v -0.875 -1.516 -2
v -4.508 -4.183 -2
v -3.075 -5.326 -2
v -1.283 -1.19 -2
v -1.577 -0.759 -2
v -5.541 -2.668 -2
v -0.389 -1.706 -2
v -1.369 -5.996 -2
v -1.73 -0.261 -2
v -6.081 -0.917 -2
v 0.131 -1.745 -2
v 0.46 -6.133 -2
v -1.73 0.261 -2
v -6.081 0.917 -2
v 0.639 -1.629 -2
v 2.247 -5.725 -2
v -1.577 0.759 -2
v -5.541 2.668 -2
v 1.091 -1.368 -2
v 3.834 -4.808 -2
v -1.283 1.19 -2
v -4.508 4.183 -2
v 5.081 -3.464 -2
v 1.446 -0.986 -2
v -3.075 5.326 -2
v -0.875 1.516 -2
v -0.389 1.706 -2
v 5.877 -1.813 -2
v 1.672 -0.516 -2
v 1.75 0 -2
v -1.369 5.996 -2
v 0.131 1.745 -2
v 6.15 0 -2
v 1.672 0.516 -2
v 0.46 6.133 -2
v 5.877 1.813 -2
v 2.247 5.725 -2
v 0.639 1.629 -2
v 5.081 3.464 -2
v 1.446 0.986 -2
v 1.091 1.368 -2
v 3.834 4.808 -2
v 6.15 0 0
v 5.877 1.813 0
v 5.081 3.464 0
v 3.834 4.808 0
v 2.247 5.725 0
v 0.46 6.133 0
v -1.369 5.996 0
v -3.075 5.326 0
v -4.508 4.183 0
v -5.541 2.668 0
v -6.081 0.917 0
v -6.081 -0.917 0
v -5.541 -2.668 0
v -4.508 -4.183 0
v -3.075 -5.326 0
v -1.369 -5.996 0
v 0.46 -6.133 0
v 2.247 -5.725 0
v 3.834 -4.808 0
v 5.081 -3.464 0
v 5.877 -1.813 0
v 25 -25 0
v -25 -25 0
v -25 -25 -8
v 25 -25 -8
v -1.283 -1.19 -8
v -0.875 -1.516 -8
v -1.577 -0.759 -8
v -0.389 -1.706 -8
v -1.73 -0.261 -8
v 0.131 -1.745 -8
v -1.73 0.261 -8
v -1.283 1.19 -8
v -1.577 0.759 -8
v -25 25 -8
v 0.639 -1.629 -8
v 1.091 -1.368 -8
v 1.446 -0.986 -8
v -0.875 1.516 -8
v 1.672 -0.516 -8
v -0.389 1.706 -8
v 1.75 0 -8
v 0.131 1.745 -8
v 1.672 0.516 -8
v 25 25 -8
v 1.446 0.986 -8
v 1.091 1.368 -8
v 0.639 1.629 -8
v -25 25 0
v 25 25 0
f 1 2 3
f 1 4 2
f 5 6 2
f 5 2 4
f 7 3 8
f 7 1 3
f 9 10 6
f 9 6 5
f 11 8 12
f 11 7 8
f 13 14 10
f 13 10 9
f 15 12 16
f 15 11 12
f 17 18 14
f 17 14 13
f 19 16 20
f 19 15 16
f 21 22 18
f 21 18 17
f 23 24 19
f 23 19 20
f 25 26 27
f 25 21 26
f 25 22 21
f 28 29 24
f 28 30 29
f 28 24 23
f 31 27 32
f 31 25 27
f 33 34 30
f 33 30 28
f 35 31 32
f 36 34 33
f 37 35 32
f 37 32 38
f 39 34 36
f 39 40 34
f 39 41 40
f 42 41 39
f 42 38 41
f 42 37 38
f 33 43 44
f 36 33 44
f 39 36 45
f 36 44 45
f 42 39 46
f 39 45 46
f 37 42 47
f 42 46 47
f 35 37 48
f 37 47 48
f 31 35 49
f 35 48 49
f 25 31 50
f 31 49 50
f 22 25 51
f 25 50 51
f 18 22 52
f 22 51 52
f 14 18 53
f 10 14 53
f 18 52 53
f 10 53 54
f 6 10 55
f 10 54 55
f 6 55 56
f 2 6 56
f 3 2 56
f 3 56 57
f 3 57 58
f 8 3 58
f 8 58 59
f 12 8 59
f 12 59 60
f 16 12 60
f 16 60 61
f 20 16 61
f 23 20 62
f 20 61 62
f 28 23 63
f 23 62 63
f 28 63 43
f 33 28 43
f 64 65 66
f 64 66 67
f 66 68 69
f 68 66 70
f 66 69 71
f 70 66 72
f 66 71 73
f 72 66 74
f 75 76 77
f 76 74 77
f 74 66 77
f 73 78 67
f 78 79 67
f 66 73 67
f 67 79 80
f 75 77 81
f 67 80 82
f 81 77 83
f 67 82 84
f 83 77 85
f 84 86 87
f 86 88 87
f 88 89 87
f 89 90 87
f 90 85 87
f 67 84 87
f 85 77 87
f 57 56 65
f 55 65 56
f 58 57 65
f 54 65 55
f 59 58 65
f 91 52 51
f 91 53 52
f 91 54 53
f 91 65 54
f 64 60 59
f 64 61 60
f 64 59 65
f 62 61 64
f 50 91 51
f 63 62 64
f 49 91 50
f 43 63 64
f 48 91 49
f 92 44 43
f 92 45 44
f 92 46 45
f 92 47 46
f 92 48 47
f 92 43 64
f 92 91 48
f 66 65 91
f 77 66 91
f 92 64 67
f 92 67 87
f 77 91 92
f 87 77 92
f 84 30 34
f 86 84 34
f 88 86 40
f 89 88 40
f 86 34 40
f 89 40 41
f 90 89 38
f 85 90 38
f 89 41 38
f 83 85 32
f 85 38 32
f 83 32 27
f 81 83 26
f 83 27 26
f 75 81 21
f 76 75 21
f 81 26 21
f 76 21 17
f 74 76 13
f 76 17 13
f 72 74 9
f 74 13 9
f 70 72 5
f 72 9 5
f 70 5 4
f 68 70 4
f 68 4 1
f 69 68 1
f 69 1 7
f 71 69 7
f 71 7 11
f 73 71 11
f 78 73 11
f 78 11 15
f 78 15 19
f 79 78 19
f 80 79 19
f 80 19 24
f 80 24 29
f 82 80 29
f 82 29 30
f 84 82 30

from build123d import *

# Parameters (mm, degrees)
F0_W     = 50
F0_H     = 50
F1_DEPTH = 8
F2_R     = 6.15
F3_DEPTH = 2
F4_R     = 1.75
F5_DEPTH = 6.001


with BuildPart() as f1:
    # F0 (on Top) → F1 (new body)
    with BuildSketch(Plane.XY):
        Rectangle(F0_W, F0_H)
    extrude(amount=-F1_DEPTH)

    # F2 (on face) → F3 (cut)
    with BuildSketch(Plane.XY):
        Circle(F2_R)
    extrude(amount=-F3_DEPTH, mode=Mode.SUBTRACT)

    # F4 (on face) → F5 (cut, through all)
    with BuildSketch(Plane.XY.offset(-2)):
        Circle(F4_R)
    extrude(amount=-F5_DEPTH, mode=Mode.SUBTRACT)


solid = f1.part
